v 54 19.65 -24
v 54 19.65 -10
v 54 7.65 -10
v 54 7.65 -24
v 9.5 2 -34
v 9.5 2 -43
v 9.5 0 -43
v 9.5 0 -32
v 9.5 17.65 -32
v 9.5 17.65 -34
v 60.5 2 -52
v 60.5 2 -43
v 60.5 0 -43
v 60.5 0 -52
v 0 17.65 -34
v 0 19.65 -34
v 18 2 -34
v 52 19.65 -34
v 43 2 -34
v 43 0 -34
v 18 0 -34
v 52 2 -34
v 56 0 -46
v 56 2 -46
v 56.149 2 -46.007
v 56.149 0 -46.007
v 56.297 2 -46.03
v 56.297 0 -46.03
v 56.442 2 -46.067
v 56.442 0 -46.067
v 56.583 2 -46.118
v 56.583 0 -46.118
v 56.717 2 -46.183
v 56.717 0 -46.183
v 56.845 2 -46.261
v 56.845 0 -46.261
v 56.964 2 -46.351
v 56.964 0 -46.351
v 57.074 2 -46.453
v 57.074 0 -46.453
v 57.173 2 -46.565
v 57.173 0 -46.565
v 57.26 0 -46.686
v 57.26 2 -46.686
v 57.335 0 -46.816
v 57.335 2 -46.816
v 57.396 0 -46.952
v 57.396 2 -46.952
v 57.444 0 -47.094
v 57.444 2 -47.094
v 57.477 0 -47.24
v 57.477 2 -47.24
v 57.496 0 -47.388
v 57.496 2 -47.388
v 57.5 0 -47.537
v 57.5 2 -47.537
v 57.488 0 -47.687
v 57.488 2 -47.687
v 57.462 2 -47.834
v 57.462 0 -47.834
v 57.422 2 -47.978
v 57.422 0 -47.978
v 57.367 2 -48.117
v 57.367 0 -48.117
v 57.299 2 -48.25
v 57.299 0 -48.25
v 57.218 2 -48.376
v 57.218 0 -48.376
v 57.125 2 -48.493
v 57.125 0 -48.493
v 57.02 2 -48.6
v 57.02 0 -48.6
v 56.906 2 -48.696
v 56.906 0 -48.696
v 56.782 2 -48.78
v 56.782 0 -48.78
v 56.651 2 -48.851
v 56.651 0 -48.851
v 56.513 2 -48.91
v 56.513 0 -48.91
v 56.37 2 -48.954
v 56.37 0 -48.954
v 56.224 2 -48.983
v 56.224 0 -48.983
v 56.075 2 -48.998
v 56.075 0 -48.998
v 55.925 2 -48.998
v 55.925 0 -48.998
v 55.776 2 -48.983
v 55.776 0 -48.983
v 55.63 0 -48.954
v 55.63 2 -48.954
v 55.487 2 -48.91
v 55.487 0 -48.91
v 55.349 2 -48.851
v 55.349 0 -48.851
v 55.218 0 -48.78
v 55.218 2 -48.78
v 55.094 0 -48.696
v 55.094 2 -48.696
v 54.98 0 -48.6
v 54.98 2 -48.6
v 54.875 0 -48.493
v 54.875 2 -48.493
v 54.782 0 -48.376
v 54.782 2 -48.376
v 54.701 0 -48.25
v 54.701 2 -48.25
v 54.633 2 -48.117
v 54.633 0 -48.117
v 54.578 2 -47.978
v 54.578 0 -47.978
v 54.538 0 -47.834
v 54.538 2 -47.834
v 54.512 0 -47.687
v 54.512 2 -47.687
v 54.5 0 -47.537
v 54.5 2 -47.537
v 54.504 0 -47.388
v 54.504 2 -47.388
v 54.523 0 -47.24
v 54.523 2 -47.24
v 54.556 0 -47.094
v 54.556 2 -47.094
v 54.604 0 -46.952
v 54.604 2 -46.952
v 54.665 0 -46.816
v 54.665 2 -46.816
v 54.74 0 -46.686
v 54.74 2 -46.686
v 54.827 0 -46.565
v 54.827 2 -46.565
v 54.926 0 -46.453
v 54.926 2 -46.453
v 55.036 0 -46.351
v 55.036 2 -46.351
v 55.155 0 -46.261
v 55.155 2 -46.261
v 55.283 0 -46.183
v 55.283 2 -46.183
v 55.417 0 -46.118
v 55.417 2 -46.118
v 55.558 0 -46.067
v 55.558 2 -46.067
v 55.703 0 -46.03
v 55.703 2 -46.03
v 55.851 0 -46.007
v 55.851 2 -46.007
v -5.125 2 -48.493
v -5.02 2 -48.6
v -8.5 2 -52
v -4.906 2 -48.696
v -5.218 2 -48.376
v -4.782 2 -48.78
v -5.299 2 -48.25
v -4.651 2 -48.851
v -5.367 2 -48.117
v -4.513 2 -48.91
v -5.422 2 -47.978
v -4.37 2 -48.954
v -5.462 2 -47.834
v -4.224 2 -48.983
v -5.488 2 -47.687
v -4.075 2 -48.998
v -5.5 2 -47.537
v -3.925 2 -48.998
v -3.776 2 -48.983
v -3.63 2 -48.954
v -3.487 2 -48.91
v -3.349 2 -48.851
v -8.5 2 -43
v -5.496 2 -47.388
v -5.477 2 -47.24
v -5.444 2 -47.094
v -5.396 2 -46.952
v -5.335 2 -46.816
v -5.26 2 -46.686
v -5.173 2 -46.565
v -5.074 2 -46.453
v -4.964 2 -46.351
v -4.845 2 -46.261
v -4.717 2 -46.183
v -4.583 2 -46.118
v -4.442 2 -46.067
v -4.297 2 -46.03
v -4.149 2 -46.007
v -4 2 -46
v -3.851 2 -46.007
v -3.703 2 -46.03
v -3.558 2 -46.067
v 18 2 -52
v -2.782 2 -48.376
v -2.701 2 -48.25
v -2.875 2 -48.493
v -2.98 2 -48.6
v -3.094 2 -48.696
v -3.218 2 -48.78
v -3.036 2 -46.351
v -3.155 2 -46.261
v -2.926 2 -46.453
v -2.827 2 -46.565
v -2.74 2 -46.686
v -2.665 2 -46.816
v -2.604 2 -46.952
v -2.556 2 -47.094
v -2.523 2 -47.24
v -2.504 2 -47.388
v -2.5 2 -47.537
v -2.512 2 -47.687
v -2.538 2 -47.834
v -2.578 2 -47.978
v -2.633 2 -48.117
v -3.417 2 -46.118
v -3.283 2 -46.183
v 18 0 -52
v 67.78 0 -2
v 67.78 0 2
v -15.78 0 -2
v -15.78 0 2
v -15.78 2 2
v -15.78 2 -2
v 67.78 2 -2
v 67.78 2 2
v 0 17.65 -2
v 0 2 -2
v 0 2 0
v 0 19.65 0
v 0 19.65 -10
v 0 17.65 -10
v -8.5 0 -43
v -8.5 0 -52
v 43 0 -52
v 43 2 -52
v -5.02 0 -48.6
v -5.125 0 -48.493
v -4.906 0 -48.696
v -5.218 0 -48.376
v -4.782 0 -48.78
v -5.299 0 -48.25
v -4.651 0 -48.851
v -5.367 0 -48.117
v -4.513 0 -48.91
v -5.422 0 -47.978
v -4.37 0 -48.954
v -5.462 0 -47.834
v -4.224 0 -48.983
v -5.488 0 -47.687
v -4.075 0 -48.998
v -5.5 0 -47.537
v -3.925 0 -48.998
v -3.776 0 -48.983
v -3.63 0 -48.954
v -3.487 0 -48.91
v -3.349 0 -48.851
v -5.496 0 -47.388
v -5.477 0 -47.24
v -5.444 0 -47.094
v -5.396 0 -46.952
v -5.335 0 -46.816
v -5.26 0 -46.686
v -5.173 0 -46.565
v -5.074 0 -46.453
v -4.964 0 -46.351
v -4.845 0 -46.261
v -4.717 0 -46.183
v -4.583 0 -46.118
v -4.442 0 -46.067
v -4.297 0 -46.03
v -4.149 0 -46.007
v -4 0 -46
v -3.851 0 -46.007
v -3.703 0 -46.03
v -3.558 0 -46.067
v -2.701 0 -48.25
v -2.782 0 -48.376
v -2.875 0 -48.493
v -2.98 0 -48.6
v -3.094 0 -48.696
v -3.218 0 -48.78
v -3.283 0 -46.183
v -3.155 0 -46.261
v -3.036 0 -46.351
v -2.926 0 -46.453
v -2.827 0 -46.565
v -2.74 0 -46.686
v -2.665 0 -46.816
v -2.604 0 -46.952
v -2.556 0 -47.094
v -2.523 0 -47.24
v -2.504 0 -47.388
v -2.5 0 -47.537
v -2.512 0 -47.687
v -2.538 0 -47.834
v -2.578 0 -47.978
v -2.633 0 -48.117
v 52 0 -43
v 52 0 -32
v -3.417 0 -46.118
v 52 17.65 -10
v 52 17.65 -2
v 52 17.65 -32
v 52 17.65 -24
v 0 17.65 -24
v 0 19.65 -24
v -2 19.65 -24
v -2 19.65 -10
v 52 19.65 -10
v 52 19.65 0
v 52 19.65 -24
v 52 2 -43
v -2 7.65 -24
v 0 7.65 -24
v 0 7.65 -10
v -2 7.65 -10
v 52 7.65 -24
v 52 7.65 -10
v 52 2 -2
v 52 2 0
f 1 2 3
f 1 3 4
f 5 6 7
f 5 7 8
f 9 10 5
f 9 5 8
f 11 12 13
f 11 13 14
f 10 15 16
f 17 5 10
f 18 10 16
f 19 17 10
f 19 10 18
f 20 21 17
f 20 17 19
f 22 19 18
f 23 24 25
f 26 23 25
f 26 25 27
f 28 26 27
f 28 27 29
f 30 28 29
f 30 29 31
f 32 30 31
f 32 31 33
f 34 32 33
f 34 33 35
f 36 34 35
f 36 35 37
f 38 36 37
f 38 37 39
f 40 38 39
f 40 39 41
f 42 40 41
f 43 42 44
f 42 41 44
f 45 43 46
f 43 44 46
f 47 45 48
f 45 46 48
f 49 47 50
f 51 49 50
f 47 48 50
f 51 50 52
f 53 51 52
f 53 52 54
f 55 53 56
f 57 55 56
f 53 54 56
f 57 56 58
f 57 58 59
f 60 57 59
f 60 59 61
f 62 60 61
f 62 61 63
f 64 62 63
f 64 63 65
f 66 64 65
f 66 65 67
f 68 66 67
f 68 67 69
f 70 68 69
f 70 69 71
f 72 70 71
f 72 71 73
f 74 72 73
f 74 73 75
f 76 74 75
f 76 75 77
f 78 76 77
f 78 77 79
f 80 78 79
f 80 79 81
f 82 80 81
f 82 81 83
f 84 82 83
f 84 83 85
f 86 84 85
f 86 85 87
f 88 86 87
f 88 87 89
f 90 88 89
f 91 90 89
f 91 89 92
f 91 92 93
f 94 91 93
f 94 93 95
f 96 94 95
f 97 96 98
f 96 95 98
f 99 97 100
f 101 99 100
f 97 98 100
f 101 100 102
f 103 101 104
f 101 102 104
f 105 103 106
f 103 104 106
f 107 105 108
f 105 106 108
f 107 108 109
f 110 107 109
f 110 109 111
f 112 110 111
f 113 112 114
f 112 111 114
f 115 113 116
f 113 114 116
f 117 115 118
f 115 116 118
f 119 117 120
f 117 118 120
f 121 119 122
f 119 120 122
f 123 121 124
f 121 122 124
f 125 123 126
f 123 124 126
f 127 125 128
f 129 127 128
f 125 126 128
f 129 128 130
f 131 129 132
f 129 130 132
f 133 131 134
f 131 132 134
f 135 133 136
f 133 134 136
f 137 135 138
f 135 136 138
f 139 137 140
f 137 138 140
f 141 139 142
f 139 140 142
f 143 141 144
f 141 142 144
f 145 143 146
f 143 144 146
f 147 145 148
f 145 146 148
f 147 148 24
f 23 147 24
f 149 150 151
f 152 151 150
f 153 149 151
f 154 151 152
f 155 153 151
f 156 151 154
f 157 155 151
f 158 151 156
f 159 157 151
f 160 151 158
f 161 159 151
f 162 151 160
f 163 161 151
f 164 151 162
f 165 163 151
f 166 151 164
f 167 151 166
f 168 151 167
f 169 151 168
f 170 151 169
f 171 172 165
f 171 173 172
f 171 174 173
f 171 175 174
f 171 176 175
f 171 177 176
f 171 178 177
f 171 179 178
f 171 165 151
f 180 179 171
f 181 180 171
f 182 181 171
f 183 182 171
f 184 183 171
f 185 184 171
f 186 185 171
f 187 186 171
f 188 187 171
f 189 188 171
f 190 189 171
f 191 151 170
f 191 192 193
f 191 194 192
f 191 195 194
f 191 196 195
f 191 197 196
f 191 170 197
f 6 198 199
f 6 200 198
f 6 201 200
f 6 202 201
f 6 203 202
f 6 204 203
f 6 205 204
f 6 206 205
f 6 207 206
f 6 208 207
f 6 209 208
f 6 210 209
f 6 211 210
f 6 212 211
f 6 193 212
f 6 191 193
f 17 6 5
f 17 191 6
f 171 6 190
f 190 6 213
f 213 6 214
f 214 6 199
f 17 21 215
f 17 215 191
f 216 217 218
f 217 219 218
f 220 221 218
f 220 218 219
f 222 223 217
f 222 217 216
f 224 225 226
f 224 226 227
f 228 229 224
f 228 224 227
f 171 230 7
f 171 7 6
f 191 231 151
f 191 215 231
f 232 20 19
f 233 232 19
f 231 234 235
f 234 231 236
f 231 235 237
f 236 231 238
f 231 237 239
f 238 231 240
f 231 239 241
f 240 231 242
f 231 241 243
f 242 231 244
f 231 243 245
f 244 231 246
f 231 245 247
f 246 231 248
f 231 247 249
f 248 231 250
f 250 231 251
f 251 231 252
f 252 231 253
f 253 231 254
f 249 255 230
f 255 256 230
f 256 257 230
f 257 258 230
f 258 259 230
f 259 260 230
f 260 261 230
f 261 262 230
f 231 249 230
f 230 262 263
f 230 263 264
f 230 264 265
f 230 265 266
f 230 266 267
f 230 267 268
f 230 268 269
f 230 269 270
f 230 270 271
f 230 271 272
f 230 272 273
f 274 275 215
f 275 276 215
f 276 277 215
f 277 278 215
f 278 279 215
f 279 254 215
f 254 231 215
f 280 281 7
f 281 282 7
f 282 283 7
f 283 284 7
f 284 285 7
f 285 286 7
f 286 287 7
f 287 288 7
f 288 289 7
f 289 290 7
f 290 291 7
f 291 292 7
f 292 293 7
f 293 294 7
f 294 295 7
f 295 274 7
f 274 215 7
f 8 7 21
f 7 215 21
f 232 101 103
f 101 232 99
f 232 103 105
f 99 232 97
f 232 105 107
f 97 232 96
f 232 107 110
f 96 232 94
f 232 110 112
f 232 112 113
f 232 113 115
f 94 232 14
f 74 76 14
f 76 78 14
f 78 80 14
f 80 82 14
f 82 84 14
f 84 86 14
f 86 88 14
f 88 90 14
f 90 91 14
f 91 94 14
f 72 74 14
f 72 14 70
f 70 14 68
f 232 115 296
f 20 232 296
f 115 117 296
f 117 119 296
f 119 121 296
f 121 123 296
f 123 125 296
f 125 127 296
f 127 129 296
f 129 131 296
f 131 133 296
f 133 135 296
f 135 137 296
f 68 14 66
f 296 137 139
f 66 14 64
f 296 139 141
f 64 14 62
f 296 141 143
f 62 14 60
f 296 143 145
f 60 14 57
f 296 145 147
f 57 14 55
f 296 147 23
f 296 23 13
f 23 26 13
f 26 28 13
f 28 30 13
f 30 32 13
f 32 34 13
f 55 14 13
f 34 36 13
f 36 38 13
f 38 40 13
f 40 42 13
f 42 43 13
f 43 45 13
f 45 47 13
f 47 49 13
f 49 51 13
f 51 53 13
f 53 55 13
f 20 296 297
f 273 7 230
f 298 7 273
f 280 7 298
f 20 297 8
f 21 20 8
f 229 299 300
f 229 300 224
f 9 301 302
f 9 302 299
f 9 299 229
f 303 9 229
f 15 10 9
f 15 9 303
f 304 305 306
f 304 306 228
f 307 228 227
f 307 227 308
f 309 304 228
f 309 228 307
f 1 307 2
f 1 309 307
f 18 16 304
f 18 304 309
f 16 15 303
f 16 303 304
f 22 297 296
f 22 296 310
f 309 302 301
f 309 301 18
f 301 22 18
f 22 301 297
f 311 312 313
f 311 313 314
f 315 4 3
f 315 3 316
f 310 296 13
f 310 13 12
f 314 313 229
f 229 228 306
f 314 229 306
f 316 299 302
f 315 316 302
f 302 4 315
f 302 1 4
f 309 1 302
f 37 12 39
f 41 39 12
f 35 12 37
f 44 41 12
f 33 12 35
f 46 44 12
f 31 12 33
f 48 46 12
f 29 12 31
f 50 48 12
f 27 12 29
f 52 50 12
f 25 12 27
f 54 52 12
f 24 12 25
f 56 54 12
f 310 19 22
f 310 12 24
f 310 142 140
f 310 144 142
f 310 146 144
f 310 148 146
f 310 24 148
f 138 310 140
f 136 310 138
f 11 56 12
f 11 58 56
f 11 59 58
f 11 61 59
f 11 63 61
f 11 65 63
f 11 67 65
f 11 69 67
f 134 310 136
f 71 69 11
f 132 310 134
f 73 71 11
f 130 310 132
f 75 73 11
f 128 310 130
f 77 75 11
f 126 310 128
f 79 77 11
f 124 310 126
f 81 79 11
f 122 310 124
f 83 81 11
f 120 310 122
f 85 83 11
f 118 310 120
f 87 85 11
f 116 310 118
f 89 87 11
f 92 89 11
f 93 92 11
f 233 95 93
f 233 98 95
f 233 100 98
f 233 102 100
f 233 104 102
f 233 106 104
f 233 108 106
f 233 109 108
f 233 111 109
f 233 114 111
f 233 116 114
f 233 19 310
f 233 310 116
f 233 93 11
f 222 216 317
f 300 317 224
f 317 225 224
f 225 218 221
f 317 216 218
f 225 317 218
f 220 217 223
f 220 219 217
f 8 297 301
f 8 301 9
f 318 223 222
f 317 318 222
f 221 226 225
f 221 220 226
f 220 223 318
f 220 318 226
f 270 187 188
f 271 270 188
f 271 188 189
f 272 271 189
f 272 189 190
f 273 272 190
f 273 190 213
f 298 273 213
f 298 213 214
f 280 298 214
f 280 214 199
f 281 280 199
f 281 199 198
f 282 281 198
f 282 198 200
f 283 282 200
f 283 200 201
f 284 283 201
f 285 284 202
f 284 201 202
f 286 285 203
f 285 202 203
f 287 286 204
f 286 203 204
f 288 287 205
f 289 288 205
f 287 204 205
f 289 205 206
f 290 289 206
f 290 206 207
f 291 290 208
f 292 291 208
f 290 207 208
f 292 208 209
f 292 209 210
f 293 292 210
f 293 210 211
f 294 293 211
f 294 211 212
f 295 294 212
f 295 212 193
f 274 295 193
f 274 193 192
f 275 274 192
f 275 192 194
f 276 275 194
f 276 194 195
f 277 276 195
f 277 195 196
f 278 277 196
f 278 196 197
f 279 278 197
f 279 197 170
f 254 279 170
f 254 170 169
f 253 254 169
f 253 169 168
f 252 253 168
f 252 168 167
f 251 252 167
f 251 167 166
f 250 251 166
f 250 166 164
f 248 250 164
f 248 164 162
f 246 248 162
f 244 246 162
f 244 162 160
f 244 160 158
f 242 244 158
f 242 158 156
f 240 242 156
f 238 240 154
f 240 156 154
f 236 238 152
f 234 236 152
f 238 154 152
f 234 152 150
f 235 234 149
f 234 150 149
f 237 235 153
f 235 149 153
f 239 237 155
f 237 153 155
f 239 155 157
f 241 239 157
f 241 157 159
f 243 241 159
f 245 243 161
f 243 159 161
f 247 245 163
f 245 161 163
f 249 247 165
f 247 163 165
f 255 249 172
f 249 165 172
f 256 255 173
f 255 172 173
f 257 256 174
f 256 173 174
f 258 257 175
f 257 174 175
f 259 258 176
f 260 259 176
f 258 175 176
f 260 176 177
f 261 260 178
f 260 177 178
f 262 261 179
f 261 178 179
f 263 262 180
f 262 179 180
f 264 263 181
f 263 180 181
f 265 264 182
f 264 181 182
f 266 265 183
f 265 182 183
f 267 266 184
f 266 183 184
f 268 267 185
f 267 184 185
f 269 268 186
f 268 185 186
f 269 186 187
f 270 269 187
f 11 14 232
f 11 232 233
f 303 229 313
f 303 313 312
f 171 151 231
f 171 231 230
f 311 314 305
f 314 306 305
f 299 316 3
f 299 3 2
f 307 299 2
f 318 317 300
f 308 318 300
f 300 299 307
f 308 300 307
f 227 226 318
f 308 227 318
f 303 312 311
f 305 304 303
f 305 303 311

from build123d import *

# Parameters (mm, degrees)
SKETCH1_W            = 52
SKETCH1_H            = 34
BOSS_EXTRUDE1_DEPTH  = 19.65
SKETCH2_W            = 52
SKETCH2_H            = 30
CUT_EXTRUDE1_DEPTH   = 17.65
SKETCH3_W            = 9
SKETCH3_H            = 2
SKETCH3_W_2          = 18
BOSS_EXTRUDE2_DEPTH  = 18
SKETCH4_W            = 18
SKETCH4_H            = 2
BOSS_EXTRUDE3_DEPTH  = 8.5
SKETCH5_W            = 18
SKETCH5_H            = 2
BOSS_EXTRUDE4_DEPTH  = 8.5
SKETCH6_R            = 1.5
CUT_EXTRUDE2_DEPTH   = 82.705400678
SKETCH7_W            = 52
SKETCH7_H            = 2
BOSS_EXTRUDE5_DEPTH  = 2
SKETCH8_W            = 4
SKETCH8_H            = 2
BOSS_EXTRUDE6_DEPTH  = 15.78
SKETCH9_W            = 4
SKETCH9_H            = 2
BOSS_EXTRUDE7_DEPTH  = 15.78
SKETCH11_W           = 11
SKETCH11_H           = 17.65
CUT_EXTRUDE3_DEPTH   = 18
SKETCH12_W           = 9
SKETCH12_H           = 2
CUT_EXTRUDE4_DEPTH   = 8.5
SKETCH14_W           = 14
SKETCH14_H           = 2
BOSS_EXTRUDE8_DEPTH  = 2
SKETCH15_W           = 14
SKETCH15_H           = 2
BOSS_EXTRUDE9_DEPTH  = 2
SKETCH16_W           = 2
SKETCH16_H           = 14
BOSS_EXTRUDE10_DEPTH = 10


with BuildPart() as part:
    # Sketch1 → Boss-Extrude1 (new body)
    with BuildSketch(Plane(origin=(0, 0, 0), x_dir=(1, 0, 0), z_dir=(0, 1, 0))):
        with Locations((26, 17)):
            Rectangle(SKETCH1_W, SKETCH1_H)
    extrude(amount=BOSS_EXTRUDE1_DEPTH)

    # Sketch2 → Cut-Extrude1 (cut)
    with BuildSketch(Plane(origin=(0, 0, 0), x_dir=(-1, 0, 0), z_dir=(0, -1, 0))):
        with Locations((-26, 17)):
            Rectangle(SKETCH2_W, SKETCH2_H)
    extrude(amount=-CUT_EXTRUDE1_DEPTH, mode=Mode.SUBTRACT)

    # Sketch3 → Boss-Extrude2 (add)
    with BuildSketch(Plane(origin=(0, 0, -34), x_dir=(-1, 0, 0), z_dir=(0, 0, -1))):
        with Locations((-47.5, 1)):
            Rectangle(SKETCH3_W, SKETCH3_H)
        with Locations((-9, 1)):
            Rectangle(SKETCH3_W_2, SKETCH3_H)
    extrude(amount=BOSS_EXTRUDE2_DEPTH)

    # Sketch4 → Boss-Extrude3 (add)
    with BuildSketch(Plane(origin=(52, 0, 0), x_dir=(0, 0, -1), z_dir=(1, 0, 0))):
        with Locations((43, 1)):
            Rectangle(SKETCH4_W, SKETCH4_H)
    extrude(amount=BOSS_EXTRUDE3_DEPTH)

    # Sketch5 → Boss-Extrude4 (add)
    with BuildSketch(Plane.ZY):
        with Locations((-43, 1)):
            Rectangle(SKETCH5_W, SKETCH5_H)
    extrude(amount=BOSS_EXTRUDE4_DEPTH)

    # Sketch6 → Cut-Extrude2 (cut, through all)
    with BuildSketch(Plane(origin=(0, 2, 0), x_dir=(1, 0, 0), z_dir=(0, 1, 0))):
        with Locations(Location((56, 47.5, 0), (0, 0, 270))):
            Circle(SKETCH6_R)
        with Locations(Location((-4, 47.5, 0), (0, 0, 270))):
            Circle(SKETCH6_R)
    extrude(amount=-CUT_EXTRUDE2_DEPTH, mode=Mode.SUBTRACT)

    # Sketch7 → Boss-Extrude5 (add)
    with BuildSketch(Plane.XY):
        with Locations((26, 1)):
            Rectangle(SKETCH7_W, SKETCH7_H)
    extrude(amount=BOSS_EXTRUDE5_DEPTH)

    # Sketch8 → Boss-Extrude6 (add)
    with BuildSketch(Plane.ZY):
        with Locations((0, 1)):
            Rectangle(SKETCH8_W, SKETCH8_H)
    extrude(amount=BOSS_EXTRUDE6_DEPTH)

    # Sketch9 → Boss-Extrude7 (add)
    with BuildSketch(Plane(origin=(52, 0, 0), x_dir=(0, 0, -1), z_dir=(1, 0, 0))):
        with Locations((0, 1)):
            Rectangle(SKETCH9_W, SKETCH9_H)
    extrude(amount=BOSS_EXTRUDE7_DEPTH)

    # Sketch11 → Cut-Extrude3 (cut)
    with BuildSketch(Plane.ZY.offset(8.5)):
        with Locations((-37.5, 8.825)):
            Rectangle(SKETCH11_W, SKETCH11_H)
    extrude(amount=-CUT_EXTRUDE3_DEPTH, mode=Mode.SUBTRACT)

    # Sketch12 → Cut-Extrude4 (cut)
    with BuildSketch(Plane(origin=(60.5, 0, 0), x_dir=(0, 0, -1), z_dir=(1, 0, 0))):
        with Locations((38.5, 1)):
            Rectangle(SKETCH12_W, SKETCH12_H)
    extrude(amount=-CUT_EXTRUDE4_DEPTH, mode=Mode.SUBTRACT)

    # Sketch14 → Boss-Extrude8 (add)
    with BuildSketch(Plane.ZY):
        with Locations((-17, 18.65)):
            Rectangle(SKETCH14_W, SKETCH14_H)
    extrude(amount=BOSS_EXTRUDE8_DEPTH)

    # Sketch15 → Boss-Extrude9 (add)
    with BuildSketch(Plane(origin=(52, 0, 0), x_dir=(0, 0, -1), z_dir=(1, 0, 0))):
        with Locations((17, 18.65)):
            Rectangle(SKETCH15_W, SKETCH15_H)
    extrude(amount=BOSS_EXTRUDE9_DEPTH)

    # Sketch16 → Boss-Extrude10 (add)
    with BuildSketch(Plane(origin=(0, 17.65, 0), x_dir=(-1, 0, 0), z_dir=(0, -1, 0))):
        with Locations((1, 17)):
            Rectangle(SKETCH16_W, SKETCH16_H)
        with Locations((-53, 17)):
            Rectangle(SKETCH16_W, SKETCH16_H)
    extrude(amount=BOSS_EXTRUDE10_DEPTH)


solid = part.part
